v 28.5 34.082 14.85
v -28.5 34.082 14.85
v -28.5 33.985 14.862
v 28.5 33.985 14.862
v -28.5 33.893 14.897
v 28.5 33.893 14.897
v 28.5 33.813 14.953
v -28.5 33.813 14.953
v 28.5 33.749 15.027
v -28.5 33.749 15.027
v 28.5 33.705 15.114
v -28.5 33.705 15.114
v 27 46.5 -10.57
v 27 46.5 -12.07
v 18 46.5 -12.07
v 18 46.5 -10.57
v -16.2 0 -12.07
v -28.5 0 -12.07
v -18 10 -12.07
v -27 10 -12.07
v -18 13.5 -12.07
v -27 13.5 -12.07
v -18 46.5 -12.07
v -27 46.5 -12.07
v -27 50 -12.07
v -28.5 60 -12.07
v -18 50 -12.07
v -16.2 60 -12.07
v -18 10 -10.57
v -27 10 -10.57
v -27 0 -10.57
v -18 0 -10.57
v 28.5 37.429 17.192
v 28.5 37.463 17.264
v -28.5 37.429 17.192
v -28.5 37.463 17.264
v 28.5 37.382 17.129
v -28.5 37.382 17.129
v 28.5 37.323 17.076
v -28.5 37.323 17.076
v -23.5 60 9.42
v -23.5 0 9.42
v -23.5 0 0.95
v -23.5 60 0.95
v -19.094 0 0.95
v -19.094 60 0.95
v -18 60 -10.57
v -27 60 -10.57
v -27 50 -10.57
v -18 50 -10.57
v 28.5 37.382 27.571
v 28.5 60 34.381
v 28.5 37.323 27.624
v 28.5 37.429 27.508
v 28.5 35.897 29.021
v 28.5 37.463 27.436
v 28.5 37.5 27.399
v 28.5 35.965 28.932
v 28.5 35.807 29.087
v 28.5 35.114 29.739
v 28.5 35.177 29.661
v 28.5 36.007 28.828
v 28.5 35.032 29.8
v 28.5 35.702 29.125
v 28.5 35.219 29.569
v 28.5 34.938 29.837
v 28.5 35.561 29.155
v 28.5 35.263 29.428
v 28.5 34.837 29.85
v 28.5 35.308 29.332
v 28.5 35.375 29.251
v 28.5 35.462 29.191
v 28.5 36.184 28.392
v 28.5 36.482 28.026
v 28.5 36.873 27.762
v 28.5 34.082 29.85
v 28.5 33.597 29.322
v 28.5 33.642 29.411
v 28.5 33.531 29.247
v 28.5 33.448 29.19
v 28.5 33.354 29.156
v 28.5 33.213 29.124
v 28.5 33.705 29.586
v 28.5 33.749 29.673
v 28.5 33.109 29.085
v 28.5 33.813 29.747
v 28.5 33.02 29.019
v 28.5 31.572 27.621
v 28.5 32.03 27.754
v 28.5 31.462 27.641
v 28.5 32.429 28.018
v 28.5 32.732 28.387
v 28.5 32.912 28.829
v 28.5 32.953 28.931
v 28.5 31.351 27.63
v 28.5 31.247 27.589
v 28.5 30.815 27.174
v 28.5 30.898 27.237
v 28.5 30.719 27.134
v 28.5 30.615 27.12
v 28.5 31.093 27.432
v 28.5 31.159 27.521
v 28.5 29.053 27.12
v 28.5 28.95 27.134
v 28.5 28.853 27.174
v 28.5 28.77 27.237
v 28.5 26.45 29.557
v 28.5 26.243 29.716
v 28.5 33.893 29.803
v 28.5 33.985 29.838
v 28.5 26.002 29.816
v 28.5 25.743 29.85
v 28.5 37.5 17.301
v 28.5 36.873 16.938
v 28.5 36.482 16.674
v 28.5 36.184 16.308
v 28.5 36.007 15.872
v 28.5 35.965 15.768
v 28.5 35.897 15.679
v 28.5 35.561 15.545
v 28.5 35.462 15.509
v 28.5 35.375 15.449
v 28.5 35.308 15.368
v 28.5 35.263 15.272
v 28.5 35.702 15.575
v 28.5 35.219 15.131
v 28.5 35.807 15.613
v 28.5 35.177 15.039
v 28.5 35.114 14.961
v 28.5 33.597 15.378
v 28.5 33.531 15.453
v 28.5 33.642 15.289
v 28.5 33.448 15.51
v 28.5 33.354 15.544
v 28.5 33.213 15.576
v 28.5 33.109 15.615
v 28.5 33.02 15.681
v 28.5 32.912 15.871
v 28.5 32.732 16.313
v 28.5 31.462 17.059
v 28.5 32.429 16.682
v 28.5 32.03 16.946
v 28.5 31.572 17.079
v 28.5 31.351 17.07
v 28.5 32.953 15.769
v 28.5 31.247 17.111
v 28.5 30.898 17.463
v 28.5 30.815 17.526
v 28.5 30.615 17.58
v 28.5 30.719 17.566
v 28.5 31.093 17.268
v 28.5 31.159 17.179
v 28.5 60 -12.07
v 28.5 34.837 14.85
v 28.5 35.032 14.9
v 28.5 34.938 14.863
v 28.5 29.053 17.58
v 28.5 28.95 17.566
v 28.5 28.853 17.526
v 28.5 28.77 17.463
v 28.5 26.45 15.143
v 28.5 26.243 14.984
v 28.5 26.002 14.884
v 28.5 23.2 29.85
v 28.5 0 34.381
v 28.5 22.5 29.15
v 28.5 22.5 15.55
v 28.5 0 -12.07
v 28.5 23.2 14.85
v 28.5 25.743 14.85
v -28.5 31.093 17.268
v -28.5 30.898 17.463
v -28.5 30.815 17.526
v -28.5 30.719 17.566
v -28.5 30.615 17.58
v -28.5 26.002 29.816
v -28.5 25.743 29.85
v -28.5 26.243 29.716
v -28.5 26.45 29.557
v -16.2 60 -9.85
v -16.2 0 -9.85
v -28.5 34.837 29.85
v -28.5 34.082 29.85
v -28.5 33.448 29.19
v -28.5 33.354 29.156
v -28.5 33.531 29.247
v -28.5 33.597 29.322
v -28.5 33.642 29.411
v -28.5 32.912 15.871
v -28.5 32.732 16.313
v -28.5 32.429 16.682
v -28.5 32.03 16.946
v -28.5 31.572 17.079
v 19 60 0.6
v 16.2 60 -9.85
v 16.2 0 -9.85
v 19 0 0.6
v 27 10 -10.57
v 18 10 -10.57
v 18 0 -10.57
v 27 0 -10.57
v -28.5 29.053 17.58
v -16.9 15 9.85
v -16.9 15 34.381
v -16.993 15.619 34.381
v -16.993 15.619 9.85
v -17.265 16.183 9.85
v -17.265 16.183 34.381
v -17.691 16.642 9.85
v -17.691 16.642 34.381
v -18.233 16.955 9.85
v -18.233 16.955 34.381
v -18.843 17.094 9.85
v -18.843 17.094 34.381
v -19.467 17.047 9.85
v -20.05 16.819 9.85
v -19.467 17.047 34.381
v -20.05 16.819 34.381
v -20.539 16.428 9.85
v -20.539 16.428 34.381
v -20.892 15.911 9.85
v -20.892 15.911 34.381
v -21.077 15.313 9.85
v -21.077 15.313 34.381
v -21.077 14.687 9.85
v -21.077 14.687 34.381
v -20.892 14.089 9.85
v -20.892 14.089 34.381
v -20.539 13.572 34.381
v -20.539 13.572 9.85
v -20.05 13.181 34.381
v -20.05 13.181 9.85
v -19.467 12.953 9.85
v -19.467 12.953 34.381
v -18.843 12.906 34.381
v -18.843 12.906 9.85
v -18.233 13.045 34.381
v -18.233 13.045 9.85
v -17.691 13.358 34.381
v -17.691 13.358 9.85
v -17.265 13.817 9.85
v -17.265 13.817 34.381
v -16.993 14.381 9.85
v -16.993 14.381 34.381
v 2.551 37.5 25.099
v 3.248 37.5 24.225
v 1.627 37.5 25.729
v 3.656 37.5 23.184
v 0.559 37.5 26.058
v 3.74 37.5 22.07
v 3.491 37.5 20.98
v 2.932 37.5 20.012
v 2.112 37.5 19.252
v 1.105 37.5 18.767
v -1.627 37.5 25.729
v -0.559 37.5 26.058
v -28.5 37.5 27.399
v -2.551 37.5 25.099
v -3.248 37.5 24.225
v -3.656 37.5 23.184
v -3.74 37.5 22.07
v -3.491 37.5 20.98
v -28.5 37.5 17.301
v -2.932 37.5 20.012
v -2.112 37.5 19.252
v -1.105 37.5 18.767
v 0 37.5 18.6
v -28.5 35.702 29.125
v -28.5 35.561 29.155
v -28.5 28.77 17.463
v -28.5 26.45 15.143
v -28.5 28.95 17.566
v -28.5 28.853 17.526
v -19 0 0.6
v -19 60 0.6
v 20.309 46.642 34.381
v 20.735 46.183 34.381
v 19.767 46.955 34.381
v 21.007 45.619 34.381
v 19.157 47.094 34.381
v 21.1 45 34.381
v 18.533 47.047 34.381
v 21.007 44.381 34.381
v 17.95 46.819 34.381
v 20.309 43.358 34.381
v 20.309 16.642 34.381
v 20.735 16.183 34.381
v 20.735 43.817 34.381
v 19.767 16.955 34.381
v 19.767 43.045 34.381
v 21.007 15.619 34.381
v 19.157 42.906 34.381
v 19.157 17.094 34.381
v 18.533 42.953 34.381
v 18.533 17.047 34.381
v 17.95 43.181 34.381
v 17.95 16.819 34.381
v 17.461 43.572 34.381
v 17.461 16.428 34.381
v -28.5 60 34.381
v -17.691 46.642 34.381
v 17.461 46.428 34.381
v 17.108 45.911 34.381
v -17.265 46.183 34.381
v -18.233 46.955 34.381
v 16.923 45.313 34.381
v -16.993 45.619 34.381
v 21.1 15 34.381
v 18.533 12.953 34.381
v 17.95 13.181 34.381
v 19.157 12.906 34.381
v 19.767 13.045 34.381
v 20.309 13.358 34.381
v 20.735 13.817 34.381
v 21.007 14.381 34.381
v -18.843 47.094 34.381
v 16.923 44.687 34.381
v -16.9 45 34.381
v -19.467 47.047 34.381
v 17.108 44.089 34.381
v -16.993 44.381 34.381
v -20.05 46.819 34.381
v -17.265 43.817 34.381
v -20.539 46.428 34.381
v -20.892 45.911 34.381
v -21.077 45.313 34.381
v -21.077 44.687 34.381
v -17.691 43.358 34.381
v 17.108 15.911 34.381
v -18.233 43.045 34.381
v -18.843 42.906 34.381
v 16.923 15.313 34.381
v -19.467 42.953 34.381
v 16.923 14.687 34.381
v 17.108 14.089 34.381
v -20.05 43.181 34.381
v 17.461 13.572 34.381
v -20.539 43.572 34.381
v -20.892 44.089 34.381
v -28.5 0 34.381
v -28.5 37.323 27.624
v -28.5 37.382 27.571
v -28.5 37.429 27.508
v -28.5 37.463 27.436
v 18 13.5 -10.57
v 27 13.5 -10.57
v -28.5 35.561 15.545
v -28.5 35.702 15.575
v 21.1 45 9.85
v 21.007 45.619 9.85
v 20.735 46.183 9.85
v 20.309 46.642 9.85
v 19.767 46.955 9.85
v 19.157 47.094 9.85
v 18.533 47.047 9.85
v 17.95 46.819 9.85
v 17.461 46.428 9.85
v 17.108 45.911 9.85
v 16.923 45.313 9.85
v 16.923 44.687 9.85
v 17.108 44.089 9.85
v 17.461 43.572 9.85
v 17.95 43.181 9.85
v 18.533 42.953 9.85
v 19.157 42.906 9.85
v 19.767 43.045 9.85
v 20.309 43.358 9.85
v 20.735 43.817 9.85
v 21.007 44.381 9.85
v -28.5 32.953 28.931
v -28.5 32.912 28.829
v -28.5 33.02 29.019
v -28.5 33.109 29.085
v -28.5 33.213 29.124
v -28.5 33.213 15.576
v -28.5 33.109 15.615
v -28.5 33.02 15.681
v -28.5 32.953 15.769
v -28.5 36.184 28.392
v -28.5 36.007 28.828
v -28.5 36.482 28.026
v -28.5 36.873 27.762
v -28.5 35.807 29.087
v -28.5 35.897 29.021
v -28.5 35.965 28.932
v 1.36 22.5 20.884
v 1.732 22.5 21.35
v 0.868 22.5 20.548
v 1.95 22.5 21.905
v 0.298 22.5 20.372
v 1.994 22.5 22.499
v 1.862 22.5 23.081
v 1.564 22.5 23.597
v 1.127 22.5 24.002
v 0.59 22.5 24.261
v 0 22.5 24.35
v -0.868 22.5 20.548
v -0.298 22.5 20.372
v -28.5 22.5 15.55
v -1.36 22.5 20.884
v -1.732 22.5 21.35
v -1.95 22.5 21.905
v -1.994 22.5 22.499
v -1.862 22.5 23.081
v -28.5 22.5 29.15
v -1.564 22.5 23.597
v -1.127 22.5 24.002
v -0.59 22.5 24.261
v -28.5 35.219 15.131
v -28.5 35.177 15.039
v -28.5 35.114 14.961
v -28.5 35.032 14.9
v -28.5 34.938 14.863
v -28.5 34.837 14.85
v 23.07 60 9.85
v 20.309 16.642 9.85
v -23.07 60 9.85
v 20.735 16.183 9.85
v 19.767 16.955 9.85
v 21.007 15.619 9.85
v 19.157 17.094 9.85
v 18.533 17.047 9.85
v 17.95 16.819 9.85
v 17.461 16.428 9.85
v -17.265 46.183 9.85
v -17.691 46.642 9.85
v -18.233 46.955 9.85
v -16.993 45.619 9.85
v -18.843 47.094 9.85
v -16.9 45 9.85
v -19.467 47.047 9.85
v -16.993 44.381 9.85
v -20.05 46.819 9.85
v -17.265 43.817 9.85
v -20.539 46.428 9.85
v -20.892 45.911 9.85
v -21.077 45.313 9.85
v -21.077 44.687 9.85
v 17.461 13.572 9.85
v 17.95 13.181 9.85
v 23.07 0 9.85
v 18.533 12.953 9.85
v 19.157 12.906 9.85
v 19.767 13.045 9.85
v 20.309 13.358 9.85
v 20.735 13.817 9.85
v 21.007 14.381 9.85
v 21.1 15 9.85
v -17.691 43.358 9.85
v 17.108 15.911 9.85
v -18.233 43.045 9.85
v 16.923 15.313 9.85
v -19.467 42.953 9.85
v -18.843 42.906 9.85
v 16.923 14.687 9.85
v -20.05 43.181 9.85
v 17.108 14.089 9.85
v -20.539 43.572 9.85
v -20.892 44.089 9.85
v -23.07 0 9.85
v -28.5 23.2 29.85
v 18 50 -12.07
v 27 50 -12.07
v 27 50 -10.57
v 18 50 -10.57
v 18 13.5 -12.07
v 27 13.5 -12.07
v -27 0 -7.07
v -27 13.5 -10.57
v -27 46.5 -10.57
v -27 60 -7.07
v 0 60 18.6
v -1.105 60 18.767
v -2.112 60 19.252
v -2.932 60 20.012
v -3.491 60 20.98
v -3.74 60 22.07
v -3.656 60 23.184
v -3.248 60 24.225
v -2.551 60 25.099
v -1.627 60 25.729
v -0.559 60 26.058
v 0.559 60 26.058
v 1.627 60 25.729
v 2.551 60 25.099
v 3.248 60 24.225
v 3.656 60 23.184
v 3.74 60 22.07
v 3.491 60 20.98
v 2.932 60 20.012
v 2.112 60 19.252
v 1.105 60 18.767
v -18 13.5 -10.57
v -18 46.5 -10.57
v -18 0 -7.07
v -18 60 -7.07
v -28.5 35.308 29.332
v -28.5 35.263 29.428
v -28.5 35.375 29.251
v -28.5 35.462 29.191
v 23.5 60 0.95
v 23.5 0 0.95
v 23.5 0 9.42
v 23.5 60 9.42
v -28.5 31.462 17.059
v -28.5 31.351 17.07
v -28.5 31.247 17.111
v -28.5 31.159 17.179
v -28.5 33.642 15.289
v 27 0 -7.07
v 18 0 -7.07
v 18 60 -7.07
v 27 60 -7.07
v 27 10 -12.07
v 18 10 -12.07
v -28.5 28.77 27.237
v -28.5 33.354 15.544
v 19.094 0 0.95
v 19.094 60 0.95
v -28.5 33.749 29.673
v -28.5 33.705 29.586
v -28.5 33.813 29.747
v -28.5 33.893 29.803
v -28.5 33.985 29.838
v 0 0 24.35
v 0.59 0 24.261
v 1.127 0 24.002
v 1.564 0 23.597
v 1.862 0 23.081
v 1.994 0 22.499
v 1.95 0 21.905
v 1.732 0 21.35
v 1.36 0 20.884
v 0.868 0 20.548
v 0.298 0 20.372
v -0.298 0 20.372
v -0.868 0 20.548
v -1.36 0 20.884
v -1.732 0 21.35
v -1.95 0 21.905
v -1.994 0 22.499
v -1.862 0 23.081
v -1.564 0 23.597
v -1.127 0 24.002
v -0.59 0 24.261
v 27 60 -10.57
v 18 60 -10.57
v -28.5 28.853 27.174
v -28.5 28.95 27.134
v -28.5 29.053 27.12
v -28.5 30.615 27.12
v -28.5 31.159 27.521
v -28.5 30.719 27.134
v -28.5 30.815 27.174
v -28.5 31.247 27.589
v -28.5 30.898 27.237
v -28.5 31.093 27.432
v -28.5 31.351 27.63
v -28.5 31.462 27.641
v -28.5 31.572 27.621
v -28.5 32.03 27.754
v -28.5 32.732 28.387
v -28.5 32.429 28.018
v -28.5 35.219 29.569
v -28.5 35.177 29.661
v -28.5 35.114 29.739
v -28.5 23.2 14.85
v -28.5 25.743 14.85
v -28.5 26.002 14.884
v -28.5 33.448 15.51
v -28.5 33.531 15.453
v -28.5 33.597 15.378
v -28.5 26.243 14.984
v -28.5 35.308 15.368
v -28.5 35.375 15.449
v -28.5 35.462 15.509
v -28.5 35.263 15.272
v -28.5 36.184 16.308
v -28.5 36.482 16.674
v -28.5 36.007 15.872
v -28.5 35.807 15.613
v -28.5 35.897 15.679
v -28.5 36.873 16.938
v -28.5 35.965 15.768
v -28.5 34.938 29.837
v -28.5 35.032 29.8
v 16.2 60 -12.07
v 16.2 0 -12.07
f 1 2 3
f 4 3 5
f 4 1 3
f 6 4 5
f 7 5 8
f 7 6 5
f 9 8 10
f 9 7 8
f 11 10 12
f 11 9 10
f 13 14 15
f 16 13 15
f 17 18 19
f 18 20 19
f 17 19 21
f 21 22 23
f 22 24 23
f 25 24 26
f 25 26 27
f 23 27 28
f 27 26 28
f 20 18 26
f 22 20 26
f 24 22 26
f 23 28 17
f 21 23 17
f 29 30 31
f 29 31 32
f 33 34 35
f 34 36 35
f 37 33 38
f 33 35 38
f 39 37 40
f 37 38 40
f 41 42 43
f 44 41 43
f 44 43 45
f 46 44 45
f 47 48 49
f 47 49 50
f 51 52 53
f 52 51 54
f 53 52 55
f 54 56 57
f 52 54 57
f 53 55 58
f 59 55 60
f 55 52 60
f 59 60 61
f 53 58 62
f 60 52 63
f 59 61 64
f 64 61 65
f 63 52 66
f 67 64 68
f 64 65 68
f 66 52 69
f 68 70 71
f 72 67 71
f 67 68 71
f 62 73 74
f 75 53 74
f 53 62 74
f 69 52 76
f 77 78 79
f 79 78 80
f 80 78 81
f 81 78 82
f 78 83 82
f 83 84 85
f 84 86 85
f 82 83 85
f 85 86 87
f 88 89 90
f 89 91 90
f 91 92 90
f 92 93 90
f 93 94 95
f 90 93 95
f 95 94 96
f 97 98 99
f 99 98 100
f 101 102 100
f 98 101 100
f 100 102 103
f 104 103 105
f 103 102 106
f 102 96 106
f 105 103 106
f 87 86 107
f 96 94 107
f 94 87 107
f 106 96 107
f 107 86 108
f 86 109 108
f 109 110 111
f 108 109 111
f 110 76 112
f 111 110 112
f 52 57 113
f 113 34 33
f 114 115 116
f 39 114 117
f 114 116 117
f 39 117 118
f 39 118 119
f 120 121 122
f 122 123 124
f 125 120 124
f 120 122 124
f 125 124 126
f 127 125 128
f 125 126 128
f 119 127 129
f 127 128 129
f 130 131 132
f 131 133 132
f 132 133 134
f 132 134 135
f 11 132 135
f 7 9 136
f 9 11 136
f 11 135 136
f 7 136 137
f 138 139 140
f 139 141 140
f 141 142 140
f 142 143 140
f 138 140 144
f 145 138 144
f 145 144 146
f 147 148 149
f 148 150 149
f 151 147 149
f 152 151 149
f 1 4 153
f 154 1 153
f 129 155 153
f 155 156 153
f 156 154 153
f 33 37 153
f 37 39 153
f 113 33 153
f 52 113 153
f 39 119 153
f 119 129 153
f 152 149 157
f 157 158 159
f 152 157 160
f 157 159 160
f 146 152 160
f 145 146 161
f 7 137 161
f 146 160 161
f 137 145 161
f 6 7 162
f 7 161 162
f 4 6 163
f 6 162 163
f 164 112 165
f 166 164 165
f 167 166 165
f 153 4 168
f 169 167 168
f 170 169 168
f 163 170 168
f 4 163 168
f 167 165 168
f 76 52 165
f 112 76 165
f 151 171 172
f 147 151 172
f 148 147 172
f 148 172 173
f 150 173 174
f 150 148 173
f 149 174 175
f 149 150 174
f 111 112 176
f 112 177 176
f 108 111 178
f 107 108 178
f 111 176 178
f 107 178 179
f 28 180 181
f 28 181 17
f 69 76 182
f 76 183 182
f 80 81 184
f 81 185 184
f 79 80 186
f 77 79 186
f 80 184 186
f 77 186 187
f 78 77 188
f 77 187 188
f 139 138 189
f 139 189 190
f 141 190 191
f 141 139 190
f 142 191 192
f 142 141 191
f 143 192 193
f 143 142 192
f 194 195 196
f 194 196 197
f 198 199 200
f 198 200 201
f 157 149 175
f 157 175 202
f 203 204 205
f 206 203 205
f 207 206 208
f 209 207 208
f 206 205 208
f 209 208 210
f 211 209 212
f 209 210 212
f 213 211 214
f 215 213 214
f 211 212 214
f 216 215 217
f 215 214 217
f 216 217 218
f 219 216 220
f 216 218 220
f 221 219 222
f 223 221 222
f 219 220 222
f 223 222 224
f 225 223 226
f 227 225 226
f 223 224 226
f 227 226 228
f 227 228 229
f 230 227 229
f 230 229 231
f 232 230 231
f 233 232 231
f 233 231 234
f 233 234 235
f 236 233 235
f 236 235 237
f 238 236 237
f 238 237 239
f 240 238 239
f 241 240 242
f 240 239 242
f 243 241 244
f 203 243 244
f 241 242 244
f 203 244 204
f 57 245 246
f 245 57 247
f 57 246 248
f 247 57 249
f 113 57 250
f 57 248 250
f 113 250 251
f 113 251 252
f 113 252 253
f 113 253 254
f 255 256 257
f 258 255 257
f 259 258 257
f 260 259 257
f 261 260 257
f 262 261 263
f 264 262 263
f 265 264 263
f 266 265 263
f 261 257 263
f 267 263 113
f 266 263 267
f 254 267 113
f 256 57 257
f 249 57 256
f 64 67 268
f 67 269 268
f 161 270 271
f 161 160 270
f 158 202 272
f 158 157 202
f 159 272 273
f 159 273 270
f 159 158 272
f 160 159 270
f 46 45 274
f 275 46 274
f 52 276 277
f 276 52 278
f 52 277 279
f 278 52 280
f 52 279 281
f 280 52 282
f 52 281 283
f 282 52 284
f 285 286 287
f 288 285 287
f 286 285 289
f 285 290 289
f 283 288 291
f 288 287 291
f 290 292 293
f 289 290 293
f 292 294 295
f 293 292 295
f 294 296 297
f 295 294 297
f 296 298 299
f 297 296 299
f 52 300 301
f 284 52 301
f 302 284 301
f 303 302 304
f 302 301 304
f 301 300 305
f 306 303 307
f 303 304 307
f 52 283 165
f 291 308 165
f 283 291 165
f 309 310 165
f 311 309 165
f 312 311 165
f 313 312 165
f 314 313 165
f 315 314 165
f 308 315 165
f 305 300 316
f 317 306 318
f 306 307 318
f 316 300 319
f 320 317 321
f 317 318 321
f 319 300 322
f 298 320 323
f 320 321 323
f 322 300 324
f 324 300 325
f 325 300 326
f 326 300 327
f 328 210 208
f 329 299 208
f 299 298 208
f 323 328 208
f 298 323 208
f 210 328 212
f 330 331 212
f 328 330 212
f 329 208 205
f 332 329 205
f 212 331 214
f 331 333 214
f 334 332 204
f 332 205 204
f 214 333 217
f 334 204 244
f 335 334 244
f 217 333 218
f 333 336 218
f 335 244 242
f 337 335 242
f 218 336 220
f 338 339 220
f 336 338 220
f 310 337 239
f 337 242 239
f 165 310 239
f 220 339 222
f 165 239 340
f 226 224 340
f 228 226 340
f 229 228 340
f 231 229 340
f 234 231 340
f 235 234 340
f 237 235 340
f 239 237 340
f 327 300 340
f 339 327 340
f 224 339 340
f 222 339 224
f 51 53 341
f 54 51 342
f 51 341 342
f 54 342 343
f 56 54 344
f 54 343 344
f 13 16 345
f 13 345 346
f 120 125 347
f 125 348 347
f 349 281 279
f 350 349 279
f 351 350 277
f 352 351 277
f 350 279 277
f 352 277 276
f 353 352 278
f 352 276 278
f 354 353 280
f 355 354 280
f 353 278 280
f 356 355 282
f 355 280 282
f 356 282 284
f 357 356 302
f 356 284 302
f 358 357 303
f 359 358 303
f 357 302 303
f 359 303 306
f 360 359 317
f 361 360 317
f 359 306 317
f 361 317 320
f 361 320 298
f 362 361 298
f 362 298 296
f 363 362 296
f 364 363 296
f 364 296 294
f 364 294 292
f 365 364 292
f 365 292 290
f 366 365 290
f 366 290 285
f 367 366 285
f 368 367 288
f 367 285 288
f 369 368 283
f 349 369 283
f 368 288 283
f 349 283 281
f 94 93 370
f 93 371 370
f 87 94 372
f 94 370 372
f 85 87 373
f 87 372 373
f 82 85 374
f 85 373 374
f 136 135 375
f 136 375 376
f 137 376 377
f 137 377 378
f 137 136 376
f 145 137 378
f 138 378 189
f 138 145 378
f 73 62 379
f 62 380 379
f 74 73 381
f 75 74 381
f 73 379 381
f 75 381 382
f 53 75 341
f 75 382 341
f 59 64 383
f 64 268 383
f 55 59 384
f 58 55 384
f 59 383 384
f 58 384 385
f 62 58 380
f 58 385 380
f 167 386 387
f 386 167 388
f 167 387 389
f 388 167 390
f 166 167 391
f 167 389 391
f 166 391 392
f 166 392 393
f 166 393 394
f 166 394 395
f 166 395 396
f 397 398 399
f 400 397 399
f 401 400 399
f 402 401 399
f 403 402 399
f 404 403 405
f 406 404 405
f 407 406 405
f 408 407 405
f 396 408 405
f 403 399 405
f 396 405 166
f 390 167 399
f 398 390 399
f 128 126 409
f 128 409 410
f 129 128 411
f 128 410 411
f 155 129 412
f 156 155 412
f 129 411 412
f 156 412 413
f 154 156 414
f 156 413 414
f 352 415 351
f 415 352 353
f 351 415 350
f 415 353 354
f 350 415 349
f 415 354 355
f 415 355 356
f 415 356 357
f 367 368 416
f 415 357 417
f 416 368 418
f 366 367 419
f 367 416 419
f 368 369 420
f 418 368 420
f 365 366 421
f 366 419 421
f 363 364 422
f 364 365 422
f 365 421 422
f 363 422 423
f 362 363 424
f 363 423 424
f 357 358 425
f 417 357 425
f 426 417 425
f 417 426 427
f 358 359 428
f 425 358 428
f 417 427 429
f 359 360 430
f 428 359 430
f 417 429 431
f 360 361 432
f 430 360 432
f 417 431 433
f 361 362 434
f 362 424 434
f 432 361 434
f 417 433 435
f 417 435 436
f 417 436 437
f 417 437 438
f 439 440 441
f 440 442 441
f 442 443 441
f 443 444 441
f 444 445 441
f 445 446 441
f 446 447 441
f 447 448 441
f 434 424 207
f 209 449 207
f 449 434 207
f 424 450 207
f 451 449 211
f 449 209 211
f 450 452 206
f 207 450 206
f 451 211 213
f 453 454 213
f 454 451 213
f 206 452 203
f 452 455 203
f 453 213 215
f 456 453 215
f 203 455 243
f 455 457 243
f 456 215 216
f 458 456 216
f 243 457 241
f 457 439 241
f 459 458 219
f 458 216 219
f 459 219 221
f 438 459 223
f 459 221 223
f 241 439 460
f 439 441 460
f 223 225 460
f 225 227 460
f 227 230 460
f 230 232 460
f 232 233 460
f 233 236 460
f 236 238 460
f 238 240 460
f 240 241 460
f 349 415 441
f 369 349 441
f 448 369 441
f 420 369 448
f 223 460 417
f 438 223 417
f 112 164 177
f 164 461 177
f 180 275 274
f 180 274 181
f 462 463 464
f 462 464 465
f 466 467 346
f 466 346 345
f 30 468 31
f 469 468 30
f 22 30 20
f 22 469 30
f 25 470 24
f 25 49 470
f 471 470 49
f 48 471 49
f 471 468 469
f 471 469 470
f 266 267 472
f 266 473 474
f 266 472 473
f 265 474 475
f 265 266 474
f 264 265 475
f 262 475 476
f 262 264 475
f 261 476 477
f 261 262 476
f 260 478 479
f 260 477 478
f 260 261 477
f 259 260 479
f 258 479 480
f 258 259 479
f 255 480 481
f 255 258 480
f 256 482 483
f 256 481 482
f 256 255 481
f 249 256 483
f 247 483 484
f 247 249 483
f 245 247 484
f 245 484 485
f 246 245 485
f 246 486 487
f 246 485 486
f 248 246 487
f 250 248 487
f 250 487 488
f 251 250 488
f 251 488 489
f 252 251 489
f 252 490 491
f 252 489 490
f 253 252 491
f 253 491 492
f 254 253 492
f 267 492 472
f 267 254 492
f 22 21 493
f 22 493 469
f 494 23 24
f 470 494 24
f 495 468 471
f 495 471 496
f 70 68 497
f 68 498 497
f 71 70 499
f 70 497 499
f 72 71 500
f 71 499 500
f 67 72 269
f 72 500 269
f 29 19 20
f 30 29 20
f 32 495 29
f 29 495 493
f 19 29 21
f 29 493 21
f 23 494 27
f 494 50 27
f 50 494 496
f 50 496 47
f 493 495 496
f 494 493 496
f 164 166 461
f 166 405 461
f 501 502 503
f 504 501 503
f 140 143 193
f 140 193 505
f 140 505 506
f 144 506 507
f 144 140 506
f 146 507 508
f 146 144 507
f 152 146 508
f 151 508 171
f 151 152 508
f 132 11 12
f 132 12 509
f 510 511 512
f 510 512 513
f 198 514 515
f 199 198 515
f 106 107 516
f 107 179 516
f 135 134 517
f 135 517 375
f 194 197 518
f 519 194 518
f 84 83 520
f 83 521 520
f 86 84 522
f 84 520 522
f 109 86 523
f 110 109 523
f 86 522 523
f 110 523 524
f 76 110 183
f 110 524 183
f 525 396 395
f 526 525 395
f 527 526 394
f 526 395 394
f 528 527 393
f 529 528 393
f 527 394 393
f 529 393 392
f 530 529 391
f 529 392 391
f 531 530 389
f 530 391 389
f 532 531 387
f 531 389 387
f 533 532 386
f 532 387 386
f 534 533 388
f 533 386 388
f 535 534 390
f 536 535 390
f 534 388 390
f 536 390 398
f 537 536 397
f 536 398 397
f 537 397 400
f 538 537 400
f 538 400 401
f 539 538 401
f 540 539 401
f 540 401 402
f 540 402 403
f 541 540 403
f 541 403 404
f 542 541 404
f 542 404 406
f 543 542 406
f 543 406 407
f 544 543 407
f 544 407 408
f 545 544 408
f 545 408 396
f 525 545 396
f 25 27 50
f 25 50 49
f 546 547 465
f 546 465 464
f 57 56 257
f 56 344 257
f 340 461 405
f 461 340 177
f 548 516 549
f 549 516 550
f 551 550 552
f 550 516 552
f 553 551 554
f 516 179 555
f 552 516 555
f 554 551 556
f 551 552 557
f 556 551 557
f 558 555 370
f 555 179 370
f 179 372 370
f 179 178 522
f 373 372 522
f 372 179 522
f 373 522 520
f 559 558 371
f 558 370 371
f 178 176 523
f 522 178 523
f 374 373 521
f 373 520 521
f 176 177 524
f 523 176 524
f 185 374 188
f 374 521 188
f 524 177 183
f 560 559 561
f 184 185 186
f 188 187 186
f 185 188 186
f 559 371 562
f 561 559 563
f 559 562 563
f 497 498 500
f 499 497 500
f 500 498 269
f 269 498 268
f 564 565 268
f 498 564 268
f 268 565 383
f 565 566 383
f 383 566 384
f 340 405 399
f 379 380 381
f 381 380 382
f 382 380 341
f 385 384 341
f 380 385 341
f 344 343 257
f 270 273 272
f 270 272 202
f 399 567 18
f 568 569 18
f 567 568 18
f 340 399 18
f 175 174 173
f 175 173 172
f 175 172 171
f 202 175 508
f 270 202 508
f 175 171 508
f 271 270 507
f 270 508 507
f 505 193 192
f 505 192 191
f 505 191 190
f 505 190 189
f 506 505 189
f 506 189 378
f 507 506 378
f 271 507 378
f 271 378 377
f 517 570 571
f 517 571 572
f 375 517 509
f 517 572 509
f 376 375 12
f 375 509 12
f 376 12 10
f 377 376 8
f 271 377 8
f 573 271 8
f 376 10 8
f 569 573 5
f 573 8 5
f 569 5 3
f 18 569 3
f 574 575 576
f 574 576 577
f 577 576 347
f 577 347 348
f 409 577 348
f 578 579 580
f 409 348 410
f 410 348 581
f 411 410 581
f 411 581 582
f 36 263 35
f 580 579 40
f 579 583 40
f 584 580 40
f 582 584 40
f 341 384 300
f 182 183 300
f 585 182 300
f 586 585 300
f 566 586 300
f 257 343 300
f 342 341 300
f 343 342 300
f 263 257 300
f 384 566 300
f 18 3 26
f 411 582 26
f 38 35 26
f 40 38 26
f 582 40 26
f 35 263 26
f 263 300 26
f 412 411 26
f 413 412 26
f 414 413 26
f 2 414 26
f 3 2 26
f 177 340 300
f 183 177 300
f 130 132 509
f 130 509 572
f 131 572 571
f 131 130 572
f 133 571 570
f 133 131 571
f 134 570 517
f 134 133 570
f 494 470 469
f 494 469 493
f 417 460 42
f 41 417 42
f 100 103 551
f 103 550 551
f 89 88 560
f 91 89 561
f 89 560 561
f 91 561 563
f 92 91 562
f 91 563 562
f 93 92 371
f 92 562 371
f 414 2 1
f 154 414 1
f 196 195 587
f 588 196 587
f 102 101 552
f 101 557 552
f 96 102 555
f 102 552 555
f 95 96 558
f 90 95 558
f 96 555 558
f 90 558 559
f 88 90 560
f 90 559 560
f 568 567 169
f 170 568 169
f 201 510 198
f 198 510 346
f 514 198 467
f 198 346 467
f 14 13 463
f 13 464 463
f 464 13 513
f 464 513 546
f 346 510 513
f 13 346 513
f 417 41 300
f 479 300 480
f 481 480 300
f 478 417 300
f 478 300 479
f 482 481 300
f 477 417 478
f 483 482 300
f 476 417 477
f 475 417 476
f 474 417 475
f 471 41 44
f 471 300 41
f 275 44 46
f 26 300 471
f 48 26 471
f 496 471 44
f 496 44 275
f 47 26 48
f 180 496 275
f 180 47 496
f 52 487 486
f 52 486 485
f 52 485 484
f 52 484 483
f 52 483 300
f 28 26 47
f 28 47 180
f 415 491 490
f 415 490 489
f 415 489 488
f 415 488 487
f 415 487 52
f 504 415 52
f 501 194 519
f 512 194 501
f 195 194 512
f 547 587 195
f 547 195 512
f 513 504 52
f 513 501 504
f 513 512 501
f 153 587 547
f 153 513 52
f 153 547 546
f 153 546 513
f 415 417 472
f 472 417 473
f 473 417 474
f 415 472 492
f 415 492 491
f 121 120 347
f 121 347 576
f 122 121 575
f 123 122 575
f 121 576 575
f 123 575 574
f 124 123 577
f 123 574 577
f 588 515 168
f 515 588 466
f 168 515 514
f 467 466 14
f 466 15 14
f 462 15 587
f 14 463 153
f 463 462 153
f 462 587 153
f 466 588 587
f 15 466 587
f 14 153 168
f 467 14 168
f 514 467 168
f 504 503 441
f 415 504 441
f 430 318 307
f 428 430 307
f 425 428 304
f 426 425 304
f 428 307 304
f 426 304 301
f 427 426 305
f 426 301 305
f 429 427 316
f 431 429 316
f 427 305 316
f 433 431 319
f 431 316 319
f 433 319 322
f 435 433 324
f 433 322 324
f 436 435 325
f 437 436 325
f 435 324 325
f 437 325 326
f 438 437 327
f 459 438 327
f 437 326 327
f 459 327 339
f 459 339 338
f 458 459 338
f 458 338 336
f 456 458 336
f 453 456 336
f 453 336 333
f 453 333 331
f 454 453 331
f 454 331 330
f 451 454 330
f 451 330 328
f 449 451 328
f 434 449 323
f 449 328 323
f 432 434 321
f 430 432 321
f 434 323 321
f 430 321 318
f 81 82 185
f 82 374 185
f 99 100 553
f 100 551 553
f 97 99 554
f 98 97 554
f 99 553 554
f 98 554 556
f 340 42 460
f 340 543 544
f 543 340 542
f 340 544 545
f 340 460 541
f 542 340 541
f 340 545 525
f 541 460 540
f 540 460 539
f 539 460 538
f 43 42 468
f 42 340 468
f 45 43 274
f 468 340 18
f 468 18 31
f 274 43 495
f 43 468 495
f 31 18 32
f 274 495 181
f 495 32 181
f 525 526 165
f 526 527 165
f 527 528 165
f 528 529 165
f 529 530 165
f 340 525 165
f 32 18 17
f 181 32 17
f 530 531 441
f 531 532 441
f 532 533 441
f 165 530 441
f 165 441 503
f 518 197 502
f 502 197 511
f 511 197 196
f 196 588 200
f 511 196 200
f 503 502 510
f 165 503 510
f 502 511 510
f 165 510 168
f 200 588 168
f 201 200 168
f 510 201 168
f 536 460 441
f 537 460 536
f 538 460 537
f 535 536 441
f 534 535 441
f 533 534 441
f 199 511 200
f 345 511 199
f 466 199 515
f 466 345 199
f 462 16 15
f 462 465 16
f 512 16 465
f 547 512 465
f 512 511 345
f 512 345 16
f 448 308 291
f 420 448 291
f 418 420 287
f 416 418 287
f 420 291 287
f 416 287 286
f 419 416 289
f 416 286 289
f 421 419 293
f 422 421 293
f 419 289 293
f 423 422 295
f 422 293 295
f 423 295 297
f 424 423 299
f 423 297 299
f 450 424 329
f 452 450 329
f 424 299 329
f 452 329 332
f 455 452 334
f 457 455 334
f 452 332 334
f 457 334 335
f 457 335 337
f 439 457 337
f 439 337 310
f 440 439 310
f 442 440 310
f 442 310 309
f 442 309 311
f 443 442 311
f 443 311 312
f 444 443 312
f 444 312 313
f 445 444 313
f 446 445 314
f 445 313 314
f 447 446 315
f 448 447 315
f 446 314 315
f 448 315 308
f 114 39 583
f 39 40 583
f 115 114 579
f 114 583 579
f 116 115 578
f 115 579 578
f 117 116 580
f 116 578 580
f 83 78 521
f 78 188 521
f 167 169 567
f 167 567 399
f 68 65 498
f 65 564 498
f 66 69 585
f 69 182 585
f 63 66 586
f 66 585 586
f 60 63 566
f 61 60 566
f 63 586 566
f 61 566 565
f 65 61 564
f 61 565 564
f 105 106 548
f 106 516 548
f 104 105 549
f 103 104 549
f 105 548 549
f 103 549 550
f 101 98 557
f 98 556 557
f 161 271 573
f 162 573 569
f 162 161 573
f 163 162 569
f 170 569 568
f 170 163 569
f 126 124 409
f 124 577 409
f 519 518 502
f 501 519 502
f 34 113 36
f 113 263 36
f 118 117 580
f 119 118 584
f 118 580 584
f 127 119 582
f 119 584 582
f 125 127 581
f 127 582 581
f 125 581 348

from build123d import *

# Parameters (mm, degrees)
SKETCH1_W           = 57
SKETCH1_H           = 28.7
BOSS_EXTRUDE1_DEPTH = 60
SKETCH2_W           = 9
SKETCH2_H           = 4
CUT_EXTRUDE1_DEPTH  = 69.064473112
BOSS_EXTRUDE2_DEPTH = 28.5
SKETCH6_W           = 15.5
SKETCH6_H           = 15.390476131
CUT_EXTRUDE2_DEPTH  = 80
BOSS_EXTRUDE5_DEPTH = 60
SKETCH10_R          = 2.1
CUT_EXTRUDE3_DEPTH  = 24.530533394
SKETCH11_W          = 61.984050455
SKETCH11_H          = 43.227353824
SKETCH11_W_2        = 6
SKETCH11_H_2        = 2.542732203
CUT_EXTRUDE4_DEPTH  = 77.839254789
SKETCH13_W          = 6.011053281
SKETCH13_H          = 2.620549071
CUT_EXTRUDE5_DEPTH  = 77.839254789
SKETCH14_W          = 9
SKETCH14_H          = 4
BOSS_EXTRUDE7_DEPTH = 60
SKETCH12_W          = 10.230058637
SKETCH12_H          = 6.686923691
BOSS_EXTRUDE6_DEPTH = 60
SKETCH15_W          = 9
SKETCH15_H          = 4
BOSS_EXTRUDE8_DEPTH = 60
SKETCH16_W          = 9
SKETCH16_H          = 1.78
CUT_EXTRUDE6_DEPTH  = 77.839254789
SKETCH17_W          = 25.75
SKETCH17_H          = 20.1006285
CUT_EXTRUDE7_DEPTH  = 77.839254789
SKETCH18_W          = 32.4
SKETCH18_H          = 12.613288226
CUT_EXTRUDE8_DEPTH  = 75.79485996
SKETCH19_W          = 57
SKETCH19_H          = 3.949842852
CUT_EXTRUDE9_DEPTH  = 75.79485996
SKETCH20_W          = 9
SKETCH20_H          = 3.5
CUT_EXTRUDE10_DEPTH = 75.79485996
SKETCH21_W          = 9
SKETCH21_H          = 3.5
CUT_EXTRUDE11_DEPTH = 1.5
SKETCH23_R          = 3.75
CUT_EXTRUDE12_DEPTH = 59.313986952
SKETCH24_R          = 2
CUT_EXTRUDE13_DEPTH = 59.313986952


with BuildPart() as part:
    # Sketch1 → Boss-Extrude1 (new body)
    with BuildSketch(Plane(origin=(0, 0, 0), x_dir=(1, 0, 0), z_dir=(0, 1, 0))):
        with Locations((0, -0.5)):
            Rectangle(SKETCH1_W, SKETCH1_H)
        Polygon((23.07, -9.85), (-23.07, -9.85), (-23.5, -9.42), (-23.5, -0.95), (-19.09385128, -0.95), (-19, -0.599742255), (-16.2, 9.85), (16.2, 9.85), (19, -0.599742255), (19.09385128, -0.95), (23.5, -0.95), (23.5, -2.9), (23.5, -9.42), align=None, mode=Mode.SUBTRACT)
    extrude(amount=BOSS_EXTRUDE1_DEPTH)

    # Sketch2 → Cut-Extrude1 (cut, through all)
    with BuildSketch(Plane.XZ):
        with Locations((24, -10.0706285)):
            Rectangle(SKETCH2_W, SKETCH2_H)
        with Locations((-24, -10.0706285)):
            Rectangle(SKETCH2_W, SKETCH2_H)
    extrude(amount=-CUT_EXTRUDE1_DEPTH, mode=Mode.SUBTRACT)

    # Sketch5 → Boss-Extrude2 (add, symmetric)
    with BuildSketch(Plane(origin=(0, 0, 0), x_dir=(0, 0, -1), z_dir=(1, 0, 0))):
        with BuildLine():
            Line((-14.85, 0), (-14.85, 23.200000017))
            Line((-14.85, 23.200000017), (-15.549999973, 22.50000003))
            Line((-15.549999973, 22.50000003), (-29.149999973, 22.50000003))
            Line((-29.149999973, 22.50000003), (-29.849999973, 23.20000003))
            Line((-29.849999973, 23.20000003), (-29.849999973, 25.743360053))
            ThreePointArc((-29.849999973, 25.743360053), (-29.773879502, 26.126043492), (-29.557106746, 26.450466847))
            Line((-29.557106746, 26.450466847), (-27.237157266, 28.770416328))
            ThreePointArc((-27.237157266, 28.770416328), (-27.150448162, 28.900185674), (-27.119999973, 29.053259055))
            Line((-27.119999973, 29.053259055), (-27.119999973, 30.615319642))
            ThreePointArc((-27.119999973, 30.615319642), (-27.150448164, 30.768393021), (-27.237157268, 30.898162365))
            Line((-27.237157268, 30.898162365), (-27.431588163, 31.09259326))
            ThreePointArc((-27.431588163, 31.09259326), (-27.613507965, 31.297692563), (-27.620638933, 31.57175403))
            ThreePointArc((-27.620638933, 31.57175403), (-28.017573243, 32.42857618), (-28.828543655, 32.91234062))
            ThreePointArc((-28.828543655, 32.91234062), (-29.01918836, 33.020436377), (-29.124259054, 33.212764861))
            Line((-29.124259054, 33.212764861), (-29.156235284, 33.354092333))
            ThreePointArc((-29.156235284, 33.354092333), (-29.24659278, 33.53064407), (-29.410649592, 33.642090719))
            Line((-29.410649592, 33.642090719), (-29.585724304, 33.70524196))
            ThreePointArc((-29.585724304, 33.70524196), (-29.777329878, 33.851609246), (-29.849999973, 34.081511694))
            Line((-29.849999973, 34.081511694), (-29.849999973, 34.837490602))
            ThreePointArc((-29.849999973, 34.837490602), (-29.772088513, 35.074680338), (-29.568705112, 35.219471078))
            Line((-29.568705112, 35.219471078), (-29.427668799, 35.263299846))
            ThreePointArc((-29.427668799, 35.263299846), (-29.25116358, 35.375371369), (-29.155313737, 35.561185593))
            Line((-29.155313737, 35.561185593), (-29.125010632, 35.702102112))
            ThreePointArc((-29.125010632, 35.702102112), (-29.020526118, 35.897067182), (-28.828406063, 36.006695082))
            ThreePointArc((-28.828406063, 36.006695082), (-28.025619489, 36.481556021), (-27.62403672, 37.32339358))
            ThreePointArc((-27.62403672, 37.32339358), (-27.540484938, 37.407225271), (-27.43605838, 37.46293655))
            Line((-27.43605838, 37.46293655), (-27.39899493, 37.5))
            Line((-27.39899493, 37.5), (-17.30100503, 37.5))
            Line((-17.30100503, 37.5), (-17.26394158, 37.46293655))
            ThreePointArc((-17.26394158, 37.46293655), (-17.159515017, 37.407225278), (-17.07596324, 37.32339358))
            ThreePointArc((-17.07596324, 37.32339358), (-16.674380468, 36.481556018), (-15.871593887, 36.006695079))
            ThreePointArc((-15.871593887, 36.006695079), (-15.679473839, 35.897067189), (-15.574989331, 35.702102127))
            Line((-15.574989331, 35.702102127), (-15.544686222, 35.561185587))
            ThreePointArc((-15.544686222, 35.561185587), (-15.448836377, 35.375371364), (-15.272331158, 35.263299843))
            Line((-15.272331158, 35.263299843), (-15.131294869, 35.219471083))
            ThreePointArc((-15.131294869, 35.219471083), (-14.927911462, 35.074680333), (-14.85, 34.837490586))
            Line((-14.85, 34.837490586), (-14.85, 60))
            Line((-14.85, 60), (-34.380533394, 60))
            Line((-34.380533394, 60), (-34.380533394, 0))
            Line((-34.380533394, 0), (-14.85, 0))
        make_face()
        with BuildLine():
            ThreePointArc((-15.142893227, 26.450466847), (-14.926120471, 26.126043492), (-14.85, 25.743360053))
            Line((-14.85, 25.743360053), (-14.85, 34.081511674))
            ThreePointArc((-14.85, 34.081511674), (-14.922670087, 33.851609245), (-15.114275644, 33.70524197))
            Line((-15.114275644, 33.70524197), (-15.289350386, 33.642090718))
            ThreePointArc((-15.289350386, 33.642090718), (-15.453407192, 33.53064407), (-15.543764688, 33.354092339))
            Line((-15.543764688, 33.354092339), (-15.57574092, 33.21276486))
            ThreePointArc((-15.57574092, 33.21276486), (-15.680811613, 33.020436377), (-15.871456319, 32.91234062))
            ThreePointArc((-15.871456319, 32.91234062), (-16.68242673, 32.42857618), (-17.07936104, 31.57175403))
            ThreePointArc((-17.07936104, 31.57175403), (-17.086492012, 31.297692565), (-17.26841181, 31.09259326))
            Line((-17.26841181, 31.09259326), (-17.462842708, 30.898162362))
            ThreePointArc((-17.462842708, 30.898162362), (-17.549551812, 30.768393016), (-17.58, 30.615319635))
            Line((-17.58, 30.615319635), (-17.58, 29.053259048))
            ThreePointArc((-17.58, 29.053259048), (-17.54955181, 28.900185669), (-17.462842705, 28.770416325))
            Line((-17.462842705, 28.770416325), (-15.142893227, 26.450466847))
        make_face()
    extrude(amount=BOSS_EXTRUDE2_DEPTH, both=True)

    # Sketch6 → Cut-Extrude2 (cut)
    with BuildSketch(Plane(origin=(0, 60, 0), x_dir=(1, 0, 0), z_dir=(0, 1, 0))):
        with Locations((0, 12.050145064)):
            Rectangle(SKETCH6_W, SKETCH6_H)
    extrude(amount=-CUT_EXTRUDE2_DEPTH, mode=Mode.SUBTRACT)

    # Sketch9 → Boss-Extrude5 (add)
    with BuildSketch(Plane(origin=(0, 60, 0), x_dir=(1, 0, 0), z_dir=(0, 1, 0))):
        Polygon((-19.5, 13.85), (-19.5, 29.1706285), (-28.5, 29.1706285), (-28.5, 26.1706285), (-33.5, 26.1706285), (-33.5, 32.1706285), (-14.5, 32.1706285), (-14.5, 13.85), align=None)
        Polygon((30.2, 12.85), (30.2, 28.735786438), (19.5, 28.735786438), (19.5, 13.85), (14.5, 13.85), (14.5, 32.1706285), (33.5, 32.1706285), (33.5, 12.85), align=None)
    extrude(amount=-BOSS_EXTRUDE5_DEPTH)

    # Sketch10 → Cut-Extrude3 (cut)
    with BuildSketch(Plane.XY.offset(34.380533394)):
        with Locations((19, 45)):
            Circle(SKETCH10_R)
        with Locations((19, 15)):
            Circle(SKETCH10_R)
        with Locations((-19, 15)):
            Circle(SKETCH10_R)
        with Locations((-19, 45)):
            Circle(SKETCH10_R)
    extrude(amount=-CUT_EXTRUDE3_DEPTH, mode=Mode.SUBTRACT)

    # Sketch11 → Cut-Extrude4 (cut, through all)
    with BuildSketch(Plane.XZ):
        with Locations((44.734239641, -35.463676912)):
            Rectangle(SKETCH11_W, SKETCH11_H)
        with Locations((32.2, -12.566438328)):
            Rectangle(SKETCH11_W_2, SKETCH11_H_2)
    extrude(amount=-CUT_EXTRUDE4_DEPTH, mode=Mode.SUBTRACT)


with BuildPart() as cut_extrude4_piece_1:
    # of the separate pieces the step leaves, piece 1, a body of its own (cut_extrude4_pieces)
    add(part.part.solids().sort_by_distance((-28.5, 23.200000017, 14.85))[0])

    # Sketch14 → Boss-Extrude7 (add, through all)
    with BuildSketch(Plane(origin=(0, 0, 0), x_dir=(-1, 0, 0), z_dir=(0, -1, 0))):
        with Locations((-24, 10.0706285)):
            Rectangle(SKETCH14_W, SKETCH14_H)
    extrude(amount=-BOSS_EXTRUDE7_DEPTH)

    # Sketch12 → Boss-Extrude6 (add, through all)
    with BuildSketch(Plane.XZ):
        with Locations((23.384970682, -10.506538155)):
            Rectangle(SKETCH12_W, SKETCH12_H)
    extrude(amount=-BOSS_EXTRUDE6_DEPTH)

    # Sketch15 → Boss-Extrude8 (add, through all)
    with BuildSketch(Plane(origin=(0, 60, 0), x_dir=(1, 0, 0), z_dir=(0, 1, 0))):
        with Locations((-24, 10.0706285)):
            Rectangle(SKETCH15_W, SKETCH15_H)
    extrude(amount=-BOSS_EXTRUDE8_DEPTH)

    # Sketch16 → Cut-Extrude6 (cut, through all)
    with BuildSketch(Plane(origin=(0, 60, 0), x_dir=(1, 0, 0), z_dir=(0, 1, 0))):
        with Locations((-24, 12.96)):
            Rectangle(SKETCH16_W, SKETCH16_H)
    extrude(amount=-CUT_EXTRUDE6_DEPTH, mode=Mode.SUBTRACT)

    # Sketch17 → Cut-Extrude7 (cut, through all)
    with BuildSketch(Plane(origin=(0, 60, 0), x_dir=(1, 0, 0), z_dir=(0, 1, 0))):
        with Locations((-20.625, 22.12031425)):
            Rectangle(SKETCH17_W, SKETCH17_H)
    extrude(amount=-CUT_EXTRUDE7_DEPTH, mode=Mode.SUBTRACT)

    # Sketch18 → Cut-Extrude8 (cut, through all)
    with BuildSketch(Plane(origin=(0, 60, 0), x_dir=(1, 0, 0), z_dir=(0, 1, 0))):
        with Locations((0, 16.156644113)):
            Rectangle(SKETCH18_W, SKETCH18_H)
    extrude(amount=-CUT_EXTRUDE8_DEPTH, mode=Mode.SUBTRACT)

    # Sketch19 → Cut-Extrude9 (cut, through all)
    with BuildSketch(Plane(origin=(0, 60, 0), x_dir=(1, 0, 0), z_dir=(0, 1, 0))):
        with Locations((0, 14.044921426)):
            Rectangle(SKETCH19_W, SKETCH19_H)
    extrude(amount=-CUT_EXTRUDE9_DEPTH, mode=Mode.SUBTRACT)

    # Sketch20 → Cut-Extrude10 (cut, through all)
    with BuildSketch(Plane(origin=(0, 60, 0), x_dir=(1, 0, 0), z_dir=(0, 1, 0))):
        with Locations((-22.5, 8.82)):
            Rectangle(SKETCH20_W, SKETCH20_H)
        with Locations((22.5, 8.82)):
            Rectangle(SKETCH20_W, SKETCH20_H)
    extrude(amount=-CUT_EXTRUDE10_DEPTH, mode=Mode.SUBTRACT)

    # Sketch21 → Cut-Extrude11 (cut)
    with BuildSketch(Plane(origin=(0, 0, -12.07), x_dir=(-1, 0, 0), z_dir=(0, 0, -1))):
        with Locations((-22.5, 48.25)):
            Rectangle(SKETCH21_W, SKETCH21_H)
        with Locations((22.5, 48.25)):
            Rectangle(SKETCH21_W, SKETCH21_H)
        with Locations((22.5, 11.75)):
            Rectangle(SKETCH21_W, SKETCH21_H)
        with Locations((-22.5, 11.75)):
            Rectangle(SKETCH21_W, SKETCH21_H)
    extrude(amount=-CUT_EXTRUDE11_DEPTH, mode=Mode.SUBTRACT)

    # Sketch23 → Cut-Extrude12 (cut, through all)
    with BuildSketch(Plane(origin=(0, 22.50000003, 0), x_dir=(1, 0, 0), z_dir=(0, 1, 0))):
        with Locations(Location((0, -22.349999973, 0), (0, 0, 90))):
            Circle(SKETCH23_R)
    extrude(amount=CUT_EXTRUDE12_DEPTH, mode=Mode.SUBTRACT)

    # Sketch24 → Cut-Extrude13 (cut, through all)
    with BuildSketch(Plane(origin=(0, 22.50000003, 0), x_dir=(1, 0, 0), z_dir=(0, 1, 0))):
        with Locations(Location((0, -22.349999973, 0), (0, 0, 270))):
            Circle(SKETCH24_R)
    extrude(amount=-CUT_EXTRUDE13_DEPTH, mode=Mode.SUBTRACT)


with BuildPart() as cut_extrude4_piece_2:
    # of the separate pieces the step leaves, piece 2, a body of its own (cut_extrude4_pieces)
    add(part.part.solids().sort_by_distance((33.5, 0, -13.85))[0])

    # Sketch13 → Cut-Extrude5 (cut, through all)
    with BuildSketch(Plane.XZ):
        with Locations((32.65361778, -14.054923964)):
            Rectangle(SKETCH13_W, SKETCH13_H)
    extrude(amount=-CUT_EXTRUDE5_DEPTH, mode=Mode.SUBTRACT)


solid = cut_extrude4_piece_1.part
